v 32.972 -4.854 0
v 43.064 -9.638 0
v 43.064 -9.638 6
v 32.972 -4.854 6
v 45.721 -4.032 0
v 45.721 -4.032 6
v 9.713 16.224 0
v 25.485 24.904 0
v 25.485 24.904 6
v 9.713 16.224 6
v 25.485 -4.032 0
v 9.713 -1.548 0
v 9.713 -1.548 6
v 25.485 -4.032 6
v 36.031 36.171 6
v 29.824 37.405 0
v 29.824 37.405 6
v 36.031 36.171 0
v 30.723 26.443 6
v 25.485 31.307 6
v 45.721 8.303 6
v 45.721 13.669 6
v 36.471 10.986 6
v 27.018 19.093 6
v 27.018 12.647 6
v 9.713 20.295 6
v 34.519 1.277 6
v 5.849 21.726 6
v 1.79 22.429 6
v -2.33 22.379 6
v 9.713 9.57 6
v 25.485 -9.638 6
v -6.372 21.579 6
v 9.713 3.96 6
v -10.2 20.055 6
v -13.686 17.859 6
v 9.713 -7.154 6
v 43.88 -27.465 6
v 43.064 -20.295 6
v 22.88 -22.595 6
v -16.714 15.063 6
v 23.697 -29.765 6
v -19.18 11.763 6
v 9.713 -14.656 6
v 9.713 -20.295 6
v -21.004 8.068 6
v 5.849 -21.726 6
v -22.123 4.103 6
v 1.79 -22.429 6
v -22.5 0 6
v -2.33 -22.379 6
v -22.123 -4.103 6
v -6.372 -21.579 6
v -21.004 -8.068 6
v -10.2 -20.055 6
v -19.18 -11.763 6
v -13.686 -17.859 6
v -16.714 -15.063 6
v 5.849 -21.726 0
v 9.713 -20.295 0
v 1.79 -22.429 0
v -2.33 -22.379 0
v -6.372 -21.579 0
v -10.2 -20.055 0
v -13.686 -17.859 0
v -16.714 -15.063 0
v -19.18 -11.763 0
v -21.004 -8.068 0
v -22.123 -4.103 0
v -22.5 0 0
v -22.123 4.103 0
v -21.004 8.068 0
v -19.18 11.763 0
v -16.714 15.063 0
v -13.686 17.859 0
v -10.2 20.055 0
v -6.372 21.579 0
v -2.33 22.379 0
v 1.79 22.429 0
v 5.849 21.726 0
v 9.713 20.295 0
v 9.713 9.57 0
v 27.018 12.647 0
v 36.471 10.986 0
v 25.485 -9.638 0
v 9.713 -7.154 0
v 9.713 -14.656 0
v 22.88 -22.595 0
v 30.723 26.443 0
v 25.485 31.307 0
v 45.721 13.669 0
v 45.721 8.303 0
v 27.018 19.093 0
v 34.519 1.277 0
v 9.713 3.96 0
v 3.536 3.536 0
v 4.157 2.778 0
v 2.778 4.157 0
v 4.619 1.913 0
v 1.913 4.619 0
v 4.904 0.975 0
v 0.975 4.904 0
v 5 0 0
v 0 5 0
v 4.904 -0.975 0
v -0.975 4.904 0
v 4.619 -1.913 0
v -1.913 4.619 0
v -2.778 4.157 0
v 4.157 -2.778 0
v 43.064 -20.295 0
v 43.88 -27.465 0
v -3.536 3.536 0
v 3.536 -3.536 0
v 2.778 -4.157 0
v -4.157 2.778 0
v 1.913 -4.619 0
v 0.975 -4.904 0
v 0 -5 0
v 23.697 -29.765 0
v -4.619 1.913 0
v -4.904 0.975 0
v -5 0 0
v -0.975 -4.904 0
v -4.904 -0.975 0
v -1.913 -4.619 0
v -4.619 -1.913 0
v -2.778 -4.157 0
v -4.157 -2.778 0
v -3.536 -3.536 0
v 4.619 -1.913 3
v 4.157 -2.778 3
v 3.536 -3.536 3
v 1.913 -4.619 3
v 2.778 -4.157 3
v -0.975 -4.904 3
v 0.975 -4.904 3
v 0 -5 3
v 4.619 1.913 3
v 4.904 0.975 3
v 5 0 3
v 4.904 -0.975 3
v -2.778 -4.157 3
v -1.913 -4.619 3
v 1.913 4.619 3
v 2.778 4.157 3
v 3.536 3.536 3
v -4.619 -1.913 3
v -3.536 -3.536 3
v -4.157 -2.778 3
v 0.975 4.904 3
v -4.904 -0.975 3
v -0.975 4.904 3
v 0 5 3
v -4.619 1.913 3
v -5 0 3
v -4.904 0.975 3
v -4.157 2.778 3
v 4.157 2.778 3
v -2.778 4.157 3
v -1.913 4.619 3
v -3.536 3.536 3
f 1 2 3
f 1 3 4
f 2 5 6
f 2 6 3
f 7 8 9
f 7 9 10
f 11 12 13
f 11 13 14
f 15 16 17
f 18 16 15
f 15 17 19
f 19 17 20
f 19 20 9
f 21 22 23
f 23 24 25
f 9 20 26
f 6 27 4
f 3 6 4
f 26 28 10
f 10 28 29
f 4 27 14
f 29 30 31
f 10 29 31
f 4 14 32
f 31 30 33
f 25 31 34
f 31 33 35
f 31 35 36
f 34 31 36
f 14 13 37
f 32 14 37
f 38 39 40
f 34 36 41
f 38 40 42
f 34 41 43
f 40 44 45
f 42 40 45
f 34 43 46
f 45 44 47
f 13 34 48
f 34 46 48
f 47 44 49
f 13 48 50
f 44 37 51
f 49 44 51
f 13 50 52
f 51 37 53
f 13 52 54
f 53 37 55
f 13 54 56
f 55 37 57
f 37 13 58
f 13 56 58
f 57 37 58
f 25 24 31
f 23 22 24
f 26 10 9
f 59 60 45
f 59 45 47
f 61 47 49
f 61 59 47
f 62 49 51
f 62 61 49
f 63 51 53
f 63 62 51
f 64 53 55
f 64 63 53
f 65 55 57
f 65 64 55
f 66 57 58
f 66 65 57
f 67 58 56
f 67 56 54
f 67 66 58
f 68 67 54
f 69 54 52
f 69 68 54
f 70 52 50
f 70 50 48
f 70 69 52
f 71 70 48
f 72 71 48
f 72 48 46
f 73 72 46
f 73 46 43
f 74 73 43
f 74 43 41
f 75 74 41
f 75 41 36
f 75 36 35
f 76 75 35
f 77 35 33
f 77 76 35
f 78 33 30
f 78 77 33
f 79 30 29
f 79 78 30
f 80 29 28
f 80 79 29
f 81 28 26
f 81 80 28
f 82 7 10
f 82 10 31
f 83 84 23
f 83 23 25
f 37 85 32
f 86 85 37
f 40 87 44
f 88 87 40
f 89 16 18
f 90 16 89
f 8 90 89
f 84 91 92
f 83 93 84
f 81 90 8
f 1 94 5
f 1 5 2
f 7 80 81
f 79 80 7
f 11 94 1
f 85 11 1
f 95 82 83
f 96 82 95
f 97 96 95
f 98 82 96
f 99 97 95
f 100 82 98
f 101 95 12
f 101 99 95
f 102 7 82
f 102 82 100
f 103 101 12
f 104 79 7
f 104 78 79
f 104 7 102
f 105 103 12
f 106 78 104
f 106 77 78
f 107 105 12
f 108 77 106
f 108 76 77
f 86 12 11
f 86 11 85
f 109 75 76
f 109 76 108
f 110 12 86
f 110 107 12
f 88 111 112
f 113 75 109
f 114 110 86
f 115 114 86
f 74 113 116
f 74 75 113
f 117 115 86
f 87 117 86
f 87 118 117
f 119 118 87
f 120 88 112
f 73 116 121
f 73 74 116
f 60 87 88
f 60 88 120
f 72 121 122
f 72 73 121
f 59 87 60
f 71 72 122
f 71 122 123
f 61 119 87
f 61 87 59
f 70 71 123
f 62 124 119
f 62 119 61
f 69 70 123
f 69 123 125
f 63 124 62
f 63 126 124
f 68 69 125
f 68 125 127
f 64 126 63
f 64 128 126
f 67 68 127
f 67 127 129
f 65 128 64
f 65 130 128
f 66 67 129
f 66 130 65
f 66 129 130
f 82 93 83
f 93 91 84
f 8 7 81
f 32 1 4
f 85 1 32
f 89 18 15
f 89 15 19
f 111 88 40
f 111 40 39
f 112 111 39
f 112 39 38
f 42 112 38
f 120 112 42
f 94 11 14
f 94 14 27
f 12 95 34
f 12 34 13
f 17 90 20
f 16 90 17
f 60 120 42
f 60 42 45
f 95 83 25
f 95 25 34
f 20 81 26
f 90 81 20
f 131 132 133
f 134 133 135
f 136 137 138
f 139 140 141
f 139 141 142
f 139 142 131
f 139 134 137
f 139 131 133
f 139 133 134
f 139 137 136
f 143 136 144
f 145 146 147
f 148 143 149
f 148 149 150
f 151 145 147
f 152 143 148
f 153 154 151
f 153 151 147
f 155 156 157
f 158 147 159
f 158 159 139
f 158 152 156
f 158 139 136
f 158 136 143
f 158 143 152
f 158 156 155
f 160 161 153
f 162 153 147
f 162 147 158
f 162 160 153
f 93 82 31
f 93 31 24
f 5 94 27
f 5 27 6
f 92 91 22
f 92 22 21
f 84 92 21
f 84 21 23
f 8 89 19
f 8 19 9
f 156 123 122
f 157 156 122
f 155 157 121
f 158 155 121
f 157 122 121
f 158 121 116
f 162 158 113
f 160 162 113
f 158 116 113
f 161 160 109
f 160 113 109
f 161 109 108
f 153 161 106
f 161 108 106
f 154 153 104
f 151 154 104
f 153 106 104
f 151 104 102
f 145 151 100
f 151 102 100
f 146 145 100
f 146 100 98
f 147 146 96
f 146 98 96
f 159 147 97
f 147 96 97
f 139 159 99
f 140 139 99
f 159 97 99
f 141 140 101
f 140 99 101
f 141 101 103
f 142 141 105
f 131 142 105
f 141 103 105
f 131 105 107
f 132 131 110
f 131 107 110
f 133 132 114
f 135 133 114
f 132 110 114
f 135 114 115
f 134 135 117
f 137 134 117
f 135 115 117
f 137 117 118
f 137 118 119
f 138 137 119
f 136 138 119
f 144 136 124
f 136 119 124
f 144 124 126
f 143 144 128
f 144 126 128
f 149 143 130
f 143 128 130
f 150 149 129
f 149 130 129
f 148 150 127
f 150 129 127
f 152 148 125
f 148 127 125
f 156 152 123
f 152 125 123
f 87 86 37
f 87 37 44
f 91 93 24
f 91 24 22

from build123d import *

# Parameters (mm, degrees)
BOSS_EXTRUDE1_DEPTH = 6
SKETCH2_R           = 5
CUT_EXTRUDE1_DEPTH  = 3


with BuildPart() as part:
    # Sketch1 → Boss-Extrude1 (new body)
    with BuildSketch(Plane(origin=(0, 0, 0), x_dir=(0, 1, 0), z_dir=(0, 0, 1))):
        with BuildLine():
            Line((16.223609114, -9.713238737), (9.569519391, -9.713238737))
            Line((9.569519391, -9.713238737), (19.093109625, -27.018057697))
            Line((19.093109625, -27.018057697), (13.668710041, -45.720503906))
            Line((13.668710041, -45.720503906), (8.303421987, -45.720503906))
            Line((8.303421987, -45.720503906), (10.986066014, -36.471184268))
            Line((10.986066014, -36.471184268), (12.646750412, -27.018057697))
            Line((12.646750412, -27.018057697), (3.960093563, -9.713238737))
            Line((3.960093563, -9.713238737), (-1.54802471, -9.713238737))
            Line((-1.54802471, -9.713238737), (-4.031835178, -25.485118253))
            Line((-4.031835178, -25.485118253), (1.277145856, -34.519377583))
            Line((1.277145856, -34.519377583), (-4.031835178, -45.720503906))
            Line((-4.031835178, -45.720503906), (-9.637527873, -43.063582152))
            Line((-9.637527873, -43.063582152), (-4.854308239, -32.971730814))
            Line((-4.854308239, -32.971730814), (-9.637527873, -25.485118253))
            Line((-9.637527873, -25.485118253), (-7.153717404, -9.713238737))
            Line((-7.153717404, -9.713238737), (-14.656334984, -9.713238737))
            Line((-14.656334984, -9.713238737), (-22.594802565, -22.879879476))
            Line((-22.594802565, -22.879879476), (-20.295393399, -43.063582152))
            Line((-20.295393399, -43.063582152), (-27.465165035, -43.880391579))
            Line((-27.465165035, -43.880391579), (-29.764574201, -23.696688902))
            Line((-29.764574201, -23.696688902), (-20.295393399, -9.713238737))
            ThreePointArc((-20.295393399, -9.713238737), (0, 22.5), (20.295393399, -9.713238737))
            Line((20.295393399, -9.713238737), (31.307295072, -25.485118253))
            Line((31.307295072, -25.485118253), (37.404948205, -29.824166519))
            Line((37.404948205, -29.824166519), (36.171384738, -36.030726629))
            Line((36.171384738, -36.030726629), (26.443205406, -30.722661353))
            Line((26.443205406, -30.722661353), (24.903556479, -25.485118253))
            Line((24.903556479, -25.485118253), (16.223609114, -9.713238737))
        make_face()
    extrude(amount=BOSS_EXTRUDE1_DEPTH)

    # Sketch2 → Cut-Extrude1 (cut)
    with BuildSketch(Plane(origin=(0, 0, 0), x_dir=(1, 0, 0), z_dir=(0, 0, -1))):
        with Locations(Location((0, 0, 0), (0, 0, 180))):
            Circle(SKETCH2_R)
    extrude(amount=-CUT_EXTRUDE1_DEPTH, mode=Mode.SUBTRACT)


solid = part.part
